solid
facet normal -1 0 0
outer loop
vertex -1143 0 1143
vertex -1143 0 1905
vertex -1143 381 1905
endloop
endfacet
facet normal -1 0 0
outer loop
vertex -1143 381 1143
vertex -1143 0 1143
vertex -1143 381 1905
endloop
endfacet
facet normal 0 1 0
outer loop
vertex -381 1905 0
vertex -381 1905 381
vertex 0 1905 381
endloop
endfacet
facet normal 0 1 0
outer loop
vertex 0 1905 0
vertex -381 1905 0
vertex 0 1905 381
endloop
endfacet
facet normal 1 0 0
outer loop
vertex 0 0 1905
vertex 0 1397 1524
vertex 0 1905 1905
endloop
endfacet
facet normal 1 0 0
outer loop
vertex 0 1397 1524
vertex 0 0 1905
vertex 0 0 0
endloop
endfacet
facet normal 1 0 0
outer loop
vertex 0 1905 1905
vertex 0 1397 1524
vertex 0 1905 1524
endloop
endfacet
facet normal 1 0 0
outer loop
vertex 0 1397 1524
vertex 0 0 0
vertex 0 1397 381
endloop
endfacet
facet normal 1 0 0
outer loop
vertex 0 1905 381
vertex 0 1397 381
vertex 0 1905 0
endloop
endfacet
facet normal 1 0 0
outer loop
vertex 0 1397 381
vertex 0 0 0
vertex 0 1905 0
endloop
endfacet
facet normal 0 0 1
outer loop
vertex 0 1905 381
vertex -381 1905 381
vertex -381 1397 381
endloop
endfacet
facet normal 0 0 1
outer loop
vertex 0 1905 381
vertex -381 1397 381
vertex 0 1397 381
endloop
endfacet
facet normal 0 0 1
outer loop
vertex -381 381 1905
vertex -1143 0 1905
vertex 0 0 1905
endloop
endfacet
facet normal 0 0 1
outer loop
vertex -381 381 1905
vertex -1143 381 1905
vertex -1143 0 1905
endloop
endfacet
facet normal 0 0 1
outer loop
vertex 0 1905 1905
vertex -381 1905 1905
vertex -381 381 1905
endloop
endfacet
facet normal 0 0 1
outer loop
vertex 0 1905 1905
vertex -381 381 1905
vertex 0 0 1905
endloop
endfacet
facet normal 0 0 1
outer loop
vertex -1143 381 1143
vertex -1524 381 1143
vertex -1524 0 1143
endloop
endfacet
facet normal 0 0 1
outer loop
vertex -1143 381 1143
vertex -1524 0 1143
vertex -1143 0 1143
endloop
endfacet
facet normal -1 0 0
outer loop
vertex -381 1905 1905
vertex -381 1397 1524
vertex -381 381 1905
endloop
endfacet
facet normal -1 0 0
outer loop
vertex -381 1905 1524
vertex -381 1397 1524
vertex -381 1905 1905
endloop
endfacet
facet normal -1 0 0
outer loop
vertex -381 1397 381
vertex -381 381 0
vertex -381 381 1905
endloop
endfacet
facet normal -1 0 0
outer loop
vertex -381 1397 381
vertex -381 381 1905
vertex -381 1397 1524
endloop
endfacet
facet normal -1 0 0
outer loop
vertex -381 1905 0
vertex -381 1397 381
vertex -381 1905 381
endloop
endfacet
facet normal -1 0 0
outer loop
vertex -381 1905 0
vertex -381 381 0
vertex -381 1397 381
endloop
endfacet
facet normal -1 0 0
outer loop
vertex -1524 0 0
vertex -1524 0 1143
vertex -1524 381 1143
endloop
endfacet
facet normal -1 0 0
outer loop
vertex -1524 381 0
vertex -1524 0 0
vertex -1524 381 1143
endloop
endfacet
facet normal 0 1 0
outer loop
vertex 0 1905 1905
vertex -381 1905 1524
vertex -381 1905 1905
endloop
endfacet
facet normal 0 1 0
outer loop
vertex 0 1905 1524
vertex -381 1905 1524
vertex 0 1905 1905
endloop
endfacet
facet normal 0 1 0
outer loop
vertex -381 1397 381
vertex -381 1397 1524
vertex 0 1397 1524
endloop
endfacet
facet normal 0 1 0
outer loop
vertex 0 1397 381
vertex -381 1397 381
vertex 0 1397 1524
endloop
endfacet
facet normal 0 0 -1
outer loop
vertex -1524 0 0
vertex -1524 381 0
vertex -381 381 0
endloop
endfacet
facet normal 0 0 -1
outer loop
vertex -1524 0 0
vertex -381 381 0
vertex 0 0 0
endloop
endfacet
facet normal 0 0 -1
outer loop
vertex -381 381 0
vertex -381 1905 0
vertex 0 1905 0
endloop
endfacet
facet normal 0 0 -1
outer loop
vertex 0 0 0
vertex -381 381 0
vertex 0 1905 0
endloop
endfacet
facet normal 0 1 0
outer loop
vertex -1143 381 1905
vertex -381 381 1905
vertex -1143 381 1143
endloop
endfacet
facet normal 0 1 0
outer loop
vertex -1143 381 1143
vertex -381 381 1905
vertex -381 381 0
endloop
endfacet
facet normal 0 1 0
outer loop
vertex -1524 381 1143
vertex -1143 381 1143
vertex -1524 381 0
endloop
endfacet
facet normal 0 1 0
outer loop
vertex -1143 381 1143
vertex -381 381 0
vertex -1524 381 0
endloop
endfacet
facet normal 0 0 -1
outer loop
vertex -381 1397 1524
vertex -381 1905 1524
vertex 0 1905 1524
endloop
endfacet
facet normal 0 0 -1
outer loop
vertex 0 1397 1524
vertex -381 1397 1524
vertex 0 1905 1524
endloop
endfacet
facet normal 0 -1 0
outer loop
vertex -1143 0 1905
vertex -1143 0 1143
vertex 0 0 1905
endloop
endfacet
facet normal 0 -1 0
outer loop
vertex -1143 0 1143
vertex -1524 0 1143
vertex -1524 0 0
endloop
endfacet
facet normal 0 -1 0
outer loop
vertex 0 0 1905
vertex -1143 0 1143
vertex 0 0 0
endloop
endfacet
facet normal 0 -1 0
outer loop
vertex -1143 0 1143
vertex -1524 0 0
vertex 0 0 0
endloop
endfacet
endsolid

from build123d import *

# Parameters (mm, degrees)
SKETCH6_W           = 381
SKETCH6_H           = 381
SKETCH6_W_2         = 1143
SKETCH6_H_2         = 1524
BOSS_EXTRUDE3_DEPTH = 1905
SKETCH7_W           = 381
SKETCH7_H           = 1143
CUT_EXTRUDE1_DEPTH  = 508
SKETCH9_W           = 381
SKETCH9_H           = 381
CUT_EXTRUDE3_DEPTH  = 762


with BuildPart() as part:
    # Sketch6 → Boss-Extrude3 (new body)
    with BuildSketch(Plane.XY):
        with Locations((-190.5, 190.5)):
            Rectangle(SKETCH6_W, SKETCH6_H)
        with Locations((-952.5, 190.5)):
            Rectangle(SKETCH6_W_2, SKETCH6_H)
        with Locations((-190.5, 1143)):
            Rectangle(SKETCH6_W, SKETCH6_H_2)
    extrude(amount=BOSS_EXTRUDE3_DEPTH)

    # Sketch7 → Cut-Extrude1 (cut)
    with BuildSketch(Plane(origin=(0, 1905, 0), x_dir=(1, 0, 0), z_dir=(0, 1, 0))):
        with Locations((-190.5, -952.5)):
            Rectangle(SKETCH7_W, SKETCH7_H)
    extrude(amount=-CUT_EXTRUDE1_DEPTH, mode=Mode.SUBTRACT)

    # Sketch9 → Cut-Extrude3 (cut)
    with BuildSketch(Plane.XY.offset(1905)):
        with Locations((-1333.5, 190.5)):
            Rectangle(SKETCH9_W, SKETCH9_H)
    extrude(amount=-CUT_EXTRUDE3_DEPTH, mode=Mode.SUBTRACT)


solid = part.part
